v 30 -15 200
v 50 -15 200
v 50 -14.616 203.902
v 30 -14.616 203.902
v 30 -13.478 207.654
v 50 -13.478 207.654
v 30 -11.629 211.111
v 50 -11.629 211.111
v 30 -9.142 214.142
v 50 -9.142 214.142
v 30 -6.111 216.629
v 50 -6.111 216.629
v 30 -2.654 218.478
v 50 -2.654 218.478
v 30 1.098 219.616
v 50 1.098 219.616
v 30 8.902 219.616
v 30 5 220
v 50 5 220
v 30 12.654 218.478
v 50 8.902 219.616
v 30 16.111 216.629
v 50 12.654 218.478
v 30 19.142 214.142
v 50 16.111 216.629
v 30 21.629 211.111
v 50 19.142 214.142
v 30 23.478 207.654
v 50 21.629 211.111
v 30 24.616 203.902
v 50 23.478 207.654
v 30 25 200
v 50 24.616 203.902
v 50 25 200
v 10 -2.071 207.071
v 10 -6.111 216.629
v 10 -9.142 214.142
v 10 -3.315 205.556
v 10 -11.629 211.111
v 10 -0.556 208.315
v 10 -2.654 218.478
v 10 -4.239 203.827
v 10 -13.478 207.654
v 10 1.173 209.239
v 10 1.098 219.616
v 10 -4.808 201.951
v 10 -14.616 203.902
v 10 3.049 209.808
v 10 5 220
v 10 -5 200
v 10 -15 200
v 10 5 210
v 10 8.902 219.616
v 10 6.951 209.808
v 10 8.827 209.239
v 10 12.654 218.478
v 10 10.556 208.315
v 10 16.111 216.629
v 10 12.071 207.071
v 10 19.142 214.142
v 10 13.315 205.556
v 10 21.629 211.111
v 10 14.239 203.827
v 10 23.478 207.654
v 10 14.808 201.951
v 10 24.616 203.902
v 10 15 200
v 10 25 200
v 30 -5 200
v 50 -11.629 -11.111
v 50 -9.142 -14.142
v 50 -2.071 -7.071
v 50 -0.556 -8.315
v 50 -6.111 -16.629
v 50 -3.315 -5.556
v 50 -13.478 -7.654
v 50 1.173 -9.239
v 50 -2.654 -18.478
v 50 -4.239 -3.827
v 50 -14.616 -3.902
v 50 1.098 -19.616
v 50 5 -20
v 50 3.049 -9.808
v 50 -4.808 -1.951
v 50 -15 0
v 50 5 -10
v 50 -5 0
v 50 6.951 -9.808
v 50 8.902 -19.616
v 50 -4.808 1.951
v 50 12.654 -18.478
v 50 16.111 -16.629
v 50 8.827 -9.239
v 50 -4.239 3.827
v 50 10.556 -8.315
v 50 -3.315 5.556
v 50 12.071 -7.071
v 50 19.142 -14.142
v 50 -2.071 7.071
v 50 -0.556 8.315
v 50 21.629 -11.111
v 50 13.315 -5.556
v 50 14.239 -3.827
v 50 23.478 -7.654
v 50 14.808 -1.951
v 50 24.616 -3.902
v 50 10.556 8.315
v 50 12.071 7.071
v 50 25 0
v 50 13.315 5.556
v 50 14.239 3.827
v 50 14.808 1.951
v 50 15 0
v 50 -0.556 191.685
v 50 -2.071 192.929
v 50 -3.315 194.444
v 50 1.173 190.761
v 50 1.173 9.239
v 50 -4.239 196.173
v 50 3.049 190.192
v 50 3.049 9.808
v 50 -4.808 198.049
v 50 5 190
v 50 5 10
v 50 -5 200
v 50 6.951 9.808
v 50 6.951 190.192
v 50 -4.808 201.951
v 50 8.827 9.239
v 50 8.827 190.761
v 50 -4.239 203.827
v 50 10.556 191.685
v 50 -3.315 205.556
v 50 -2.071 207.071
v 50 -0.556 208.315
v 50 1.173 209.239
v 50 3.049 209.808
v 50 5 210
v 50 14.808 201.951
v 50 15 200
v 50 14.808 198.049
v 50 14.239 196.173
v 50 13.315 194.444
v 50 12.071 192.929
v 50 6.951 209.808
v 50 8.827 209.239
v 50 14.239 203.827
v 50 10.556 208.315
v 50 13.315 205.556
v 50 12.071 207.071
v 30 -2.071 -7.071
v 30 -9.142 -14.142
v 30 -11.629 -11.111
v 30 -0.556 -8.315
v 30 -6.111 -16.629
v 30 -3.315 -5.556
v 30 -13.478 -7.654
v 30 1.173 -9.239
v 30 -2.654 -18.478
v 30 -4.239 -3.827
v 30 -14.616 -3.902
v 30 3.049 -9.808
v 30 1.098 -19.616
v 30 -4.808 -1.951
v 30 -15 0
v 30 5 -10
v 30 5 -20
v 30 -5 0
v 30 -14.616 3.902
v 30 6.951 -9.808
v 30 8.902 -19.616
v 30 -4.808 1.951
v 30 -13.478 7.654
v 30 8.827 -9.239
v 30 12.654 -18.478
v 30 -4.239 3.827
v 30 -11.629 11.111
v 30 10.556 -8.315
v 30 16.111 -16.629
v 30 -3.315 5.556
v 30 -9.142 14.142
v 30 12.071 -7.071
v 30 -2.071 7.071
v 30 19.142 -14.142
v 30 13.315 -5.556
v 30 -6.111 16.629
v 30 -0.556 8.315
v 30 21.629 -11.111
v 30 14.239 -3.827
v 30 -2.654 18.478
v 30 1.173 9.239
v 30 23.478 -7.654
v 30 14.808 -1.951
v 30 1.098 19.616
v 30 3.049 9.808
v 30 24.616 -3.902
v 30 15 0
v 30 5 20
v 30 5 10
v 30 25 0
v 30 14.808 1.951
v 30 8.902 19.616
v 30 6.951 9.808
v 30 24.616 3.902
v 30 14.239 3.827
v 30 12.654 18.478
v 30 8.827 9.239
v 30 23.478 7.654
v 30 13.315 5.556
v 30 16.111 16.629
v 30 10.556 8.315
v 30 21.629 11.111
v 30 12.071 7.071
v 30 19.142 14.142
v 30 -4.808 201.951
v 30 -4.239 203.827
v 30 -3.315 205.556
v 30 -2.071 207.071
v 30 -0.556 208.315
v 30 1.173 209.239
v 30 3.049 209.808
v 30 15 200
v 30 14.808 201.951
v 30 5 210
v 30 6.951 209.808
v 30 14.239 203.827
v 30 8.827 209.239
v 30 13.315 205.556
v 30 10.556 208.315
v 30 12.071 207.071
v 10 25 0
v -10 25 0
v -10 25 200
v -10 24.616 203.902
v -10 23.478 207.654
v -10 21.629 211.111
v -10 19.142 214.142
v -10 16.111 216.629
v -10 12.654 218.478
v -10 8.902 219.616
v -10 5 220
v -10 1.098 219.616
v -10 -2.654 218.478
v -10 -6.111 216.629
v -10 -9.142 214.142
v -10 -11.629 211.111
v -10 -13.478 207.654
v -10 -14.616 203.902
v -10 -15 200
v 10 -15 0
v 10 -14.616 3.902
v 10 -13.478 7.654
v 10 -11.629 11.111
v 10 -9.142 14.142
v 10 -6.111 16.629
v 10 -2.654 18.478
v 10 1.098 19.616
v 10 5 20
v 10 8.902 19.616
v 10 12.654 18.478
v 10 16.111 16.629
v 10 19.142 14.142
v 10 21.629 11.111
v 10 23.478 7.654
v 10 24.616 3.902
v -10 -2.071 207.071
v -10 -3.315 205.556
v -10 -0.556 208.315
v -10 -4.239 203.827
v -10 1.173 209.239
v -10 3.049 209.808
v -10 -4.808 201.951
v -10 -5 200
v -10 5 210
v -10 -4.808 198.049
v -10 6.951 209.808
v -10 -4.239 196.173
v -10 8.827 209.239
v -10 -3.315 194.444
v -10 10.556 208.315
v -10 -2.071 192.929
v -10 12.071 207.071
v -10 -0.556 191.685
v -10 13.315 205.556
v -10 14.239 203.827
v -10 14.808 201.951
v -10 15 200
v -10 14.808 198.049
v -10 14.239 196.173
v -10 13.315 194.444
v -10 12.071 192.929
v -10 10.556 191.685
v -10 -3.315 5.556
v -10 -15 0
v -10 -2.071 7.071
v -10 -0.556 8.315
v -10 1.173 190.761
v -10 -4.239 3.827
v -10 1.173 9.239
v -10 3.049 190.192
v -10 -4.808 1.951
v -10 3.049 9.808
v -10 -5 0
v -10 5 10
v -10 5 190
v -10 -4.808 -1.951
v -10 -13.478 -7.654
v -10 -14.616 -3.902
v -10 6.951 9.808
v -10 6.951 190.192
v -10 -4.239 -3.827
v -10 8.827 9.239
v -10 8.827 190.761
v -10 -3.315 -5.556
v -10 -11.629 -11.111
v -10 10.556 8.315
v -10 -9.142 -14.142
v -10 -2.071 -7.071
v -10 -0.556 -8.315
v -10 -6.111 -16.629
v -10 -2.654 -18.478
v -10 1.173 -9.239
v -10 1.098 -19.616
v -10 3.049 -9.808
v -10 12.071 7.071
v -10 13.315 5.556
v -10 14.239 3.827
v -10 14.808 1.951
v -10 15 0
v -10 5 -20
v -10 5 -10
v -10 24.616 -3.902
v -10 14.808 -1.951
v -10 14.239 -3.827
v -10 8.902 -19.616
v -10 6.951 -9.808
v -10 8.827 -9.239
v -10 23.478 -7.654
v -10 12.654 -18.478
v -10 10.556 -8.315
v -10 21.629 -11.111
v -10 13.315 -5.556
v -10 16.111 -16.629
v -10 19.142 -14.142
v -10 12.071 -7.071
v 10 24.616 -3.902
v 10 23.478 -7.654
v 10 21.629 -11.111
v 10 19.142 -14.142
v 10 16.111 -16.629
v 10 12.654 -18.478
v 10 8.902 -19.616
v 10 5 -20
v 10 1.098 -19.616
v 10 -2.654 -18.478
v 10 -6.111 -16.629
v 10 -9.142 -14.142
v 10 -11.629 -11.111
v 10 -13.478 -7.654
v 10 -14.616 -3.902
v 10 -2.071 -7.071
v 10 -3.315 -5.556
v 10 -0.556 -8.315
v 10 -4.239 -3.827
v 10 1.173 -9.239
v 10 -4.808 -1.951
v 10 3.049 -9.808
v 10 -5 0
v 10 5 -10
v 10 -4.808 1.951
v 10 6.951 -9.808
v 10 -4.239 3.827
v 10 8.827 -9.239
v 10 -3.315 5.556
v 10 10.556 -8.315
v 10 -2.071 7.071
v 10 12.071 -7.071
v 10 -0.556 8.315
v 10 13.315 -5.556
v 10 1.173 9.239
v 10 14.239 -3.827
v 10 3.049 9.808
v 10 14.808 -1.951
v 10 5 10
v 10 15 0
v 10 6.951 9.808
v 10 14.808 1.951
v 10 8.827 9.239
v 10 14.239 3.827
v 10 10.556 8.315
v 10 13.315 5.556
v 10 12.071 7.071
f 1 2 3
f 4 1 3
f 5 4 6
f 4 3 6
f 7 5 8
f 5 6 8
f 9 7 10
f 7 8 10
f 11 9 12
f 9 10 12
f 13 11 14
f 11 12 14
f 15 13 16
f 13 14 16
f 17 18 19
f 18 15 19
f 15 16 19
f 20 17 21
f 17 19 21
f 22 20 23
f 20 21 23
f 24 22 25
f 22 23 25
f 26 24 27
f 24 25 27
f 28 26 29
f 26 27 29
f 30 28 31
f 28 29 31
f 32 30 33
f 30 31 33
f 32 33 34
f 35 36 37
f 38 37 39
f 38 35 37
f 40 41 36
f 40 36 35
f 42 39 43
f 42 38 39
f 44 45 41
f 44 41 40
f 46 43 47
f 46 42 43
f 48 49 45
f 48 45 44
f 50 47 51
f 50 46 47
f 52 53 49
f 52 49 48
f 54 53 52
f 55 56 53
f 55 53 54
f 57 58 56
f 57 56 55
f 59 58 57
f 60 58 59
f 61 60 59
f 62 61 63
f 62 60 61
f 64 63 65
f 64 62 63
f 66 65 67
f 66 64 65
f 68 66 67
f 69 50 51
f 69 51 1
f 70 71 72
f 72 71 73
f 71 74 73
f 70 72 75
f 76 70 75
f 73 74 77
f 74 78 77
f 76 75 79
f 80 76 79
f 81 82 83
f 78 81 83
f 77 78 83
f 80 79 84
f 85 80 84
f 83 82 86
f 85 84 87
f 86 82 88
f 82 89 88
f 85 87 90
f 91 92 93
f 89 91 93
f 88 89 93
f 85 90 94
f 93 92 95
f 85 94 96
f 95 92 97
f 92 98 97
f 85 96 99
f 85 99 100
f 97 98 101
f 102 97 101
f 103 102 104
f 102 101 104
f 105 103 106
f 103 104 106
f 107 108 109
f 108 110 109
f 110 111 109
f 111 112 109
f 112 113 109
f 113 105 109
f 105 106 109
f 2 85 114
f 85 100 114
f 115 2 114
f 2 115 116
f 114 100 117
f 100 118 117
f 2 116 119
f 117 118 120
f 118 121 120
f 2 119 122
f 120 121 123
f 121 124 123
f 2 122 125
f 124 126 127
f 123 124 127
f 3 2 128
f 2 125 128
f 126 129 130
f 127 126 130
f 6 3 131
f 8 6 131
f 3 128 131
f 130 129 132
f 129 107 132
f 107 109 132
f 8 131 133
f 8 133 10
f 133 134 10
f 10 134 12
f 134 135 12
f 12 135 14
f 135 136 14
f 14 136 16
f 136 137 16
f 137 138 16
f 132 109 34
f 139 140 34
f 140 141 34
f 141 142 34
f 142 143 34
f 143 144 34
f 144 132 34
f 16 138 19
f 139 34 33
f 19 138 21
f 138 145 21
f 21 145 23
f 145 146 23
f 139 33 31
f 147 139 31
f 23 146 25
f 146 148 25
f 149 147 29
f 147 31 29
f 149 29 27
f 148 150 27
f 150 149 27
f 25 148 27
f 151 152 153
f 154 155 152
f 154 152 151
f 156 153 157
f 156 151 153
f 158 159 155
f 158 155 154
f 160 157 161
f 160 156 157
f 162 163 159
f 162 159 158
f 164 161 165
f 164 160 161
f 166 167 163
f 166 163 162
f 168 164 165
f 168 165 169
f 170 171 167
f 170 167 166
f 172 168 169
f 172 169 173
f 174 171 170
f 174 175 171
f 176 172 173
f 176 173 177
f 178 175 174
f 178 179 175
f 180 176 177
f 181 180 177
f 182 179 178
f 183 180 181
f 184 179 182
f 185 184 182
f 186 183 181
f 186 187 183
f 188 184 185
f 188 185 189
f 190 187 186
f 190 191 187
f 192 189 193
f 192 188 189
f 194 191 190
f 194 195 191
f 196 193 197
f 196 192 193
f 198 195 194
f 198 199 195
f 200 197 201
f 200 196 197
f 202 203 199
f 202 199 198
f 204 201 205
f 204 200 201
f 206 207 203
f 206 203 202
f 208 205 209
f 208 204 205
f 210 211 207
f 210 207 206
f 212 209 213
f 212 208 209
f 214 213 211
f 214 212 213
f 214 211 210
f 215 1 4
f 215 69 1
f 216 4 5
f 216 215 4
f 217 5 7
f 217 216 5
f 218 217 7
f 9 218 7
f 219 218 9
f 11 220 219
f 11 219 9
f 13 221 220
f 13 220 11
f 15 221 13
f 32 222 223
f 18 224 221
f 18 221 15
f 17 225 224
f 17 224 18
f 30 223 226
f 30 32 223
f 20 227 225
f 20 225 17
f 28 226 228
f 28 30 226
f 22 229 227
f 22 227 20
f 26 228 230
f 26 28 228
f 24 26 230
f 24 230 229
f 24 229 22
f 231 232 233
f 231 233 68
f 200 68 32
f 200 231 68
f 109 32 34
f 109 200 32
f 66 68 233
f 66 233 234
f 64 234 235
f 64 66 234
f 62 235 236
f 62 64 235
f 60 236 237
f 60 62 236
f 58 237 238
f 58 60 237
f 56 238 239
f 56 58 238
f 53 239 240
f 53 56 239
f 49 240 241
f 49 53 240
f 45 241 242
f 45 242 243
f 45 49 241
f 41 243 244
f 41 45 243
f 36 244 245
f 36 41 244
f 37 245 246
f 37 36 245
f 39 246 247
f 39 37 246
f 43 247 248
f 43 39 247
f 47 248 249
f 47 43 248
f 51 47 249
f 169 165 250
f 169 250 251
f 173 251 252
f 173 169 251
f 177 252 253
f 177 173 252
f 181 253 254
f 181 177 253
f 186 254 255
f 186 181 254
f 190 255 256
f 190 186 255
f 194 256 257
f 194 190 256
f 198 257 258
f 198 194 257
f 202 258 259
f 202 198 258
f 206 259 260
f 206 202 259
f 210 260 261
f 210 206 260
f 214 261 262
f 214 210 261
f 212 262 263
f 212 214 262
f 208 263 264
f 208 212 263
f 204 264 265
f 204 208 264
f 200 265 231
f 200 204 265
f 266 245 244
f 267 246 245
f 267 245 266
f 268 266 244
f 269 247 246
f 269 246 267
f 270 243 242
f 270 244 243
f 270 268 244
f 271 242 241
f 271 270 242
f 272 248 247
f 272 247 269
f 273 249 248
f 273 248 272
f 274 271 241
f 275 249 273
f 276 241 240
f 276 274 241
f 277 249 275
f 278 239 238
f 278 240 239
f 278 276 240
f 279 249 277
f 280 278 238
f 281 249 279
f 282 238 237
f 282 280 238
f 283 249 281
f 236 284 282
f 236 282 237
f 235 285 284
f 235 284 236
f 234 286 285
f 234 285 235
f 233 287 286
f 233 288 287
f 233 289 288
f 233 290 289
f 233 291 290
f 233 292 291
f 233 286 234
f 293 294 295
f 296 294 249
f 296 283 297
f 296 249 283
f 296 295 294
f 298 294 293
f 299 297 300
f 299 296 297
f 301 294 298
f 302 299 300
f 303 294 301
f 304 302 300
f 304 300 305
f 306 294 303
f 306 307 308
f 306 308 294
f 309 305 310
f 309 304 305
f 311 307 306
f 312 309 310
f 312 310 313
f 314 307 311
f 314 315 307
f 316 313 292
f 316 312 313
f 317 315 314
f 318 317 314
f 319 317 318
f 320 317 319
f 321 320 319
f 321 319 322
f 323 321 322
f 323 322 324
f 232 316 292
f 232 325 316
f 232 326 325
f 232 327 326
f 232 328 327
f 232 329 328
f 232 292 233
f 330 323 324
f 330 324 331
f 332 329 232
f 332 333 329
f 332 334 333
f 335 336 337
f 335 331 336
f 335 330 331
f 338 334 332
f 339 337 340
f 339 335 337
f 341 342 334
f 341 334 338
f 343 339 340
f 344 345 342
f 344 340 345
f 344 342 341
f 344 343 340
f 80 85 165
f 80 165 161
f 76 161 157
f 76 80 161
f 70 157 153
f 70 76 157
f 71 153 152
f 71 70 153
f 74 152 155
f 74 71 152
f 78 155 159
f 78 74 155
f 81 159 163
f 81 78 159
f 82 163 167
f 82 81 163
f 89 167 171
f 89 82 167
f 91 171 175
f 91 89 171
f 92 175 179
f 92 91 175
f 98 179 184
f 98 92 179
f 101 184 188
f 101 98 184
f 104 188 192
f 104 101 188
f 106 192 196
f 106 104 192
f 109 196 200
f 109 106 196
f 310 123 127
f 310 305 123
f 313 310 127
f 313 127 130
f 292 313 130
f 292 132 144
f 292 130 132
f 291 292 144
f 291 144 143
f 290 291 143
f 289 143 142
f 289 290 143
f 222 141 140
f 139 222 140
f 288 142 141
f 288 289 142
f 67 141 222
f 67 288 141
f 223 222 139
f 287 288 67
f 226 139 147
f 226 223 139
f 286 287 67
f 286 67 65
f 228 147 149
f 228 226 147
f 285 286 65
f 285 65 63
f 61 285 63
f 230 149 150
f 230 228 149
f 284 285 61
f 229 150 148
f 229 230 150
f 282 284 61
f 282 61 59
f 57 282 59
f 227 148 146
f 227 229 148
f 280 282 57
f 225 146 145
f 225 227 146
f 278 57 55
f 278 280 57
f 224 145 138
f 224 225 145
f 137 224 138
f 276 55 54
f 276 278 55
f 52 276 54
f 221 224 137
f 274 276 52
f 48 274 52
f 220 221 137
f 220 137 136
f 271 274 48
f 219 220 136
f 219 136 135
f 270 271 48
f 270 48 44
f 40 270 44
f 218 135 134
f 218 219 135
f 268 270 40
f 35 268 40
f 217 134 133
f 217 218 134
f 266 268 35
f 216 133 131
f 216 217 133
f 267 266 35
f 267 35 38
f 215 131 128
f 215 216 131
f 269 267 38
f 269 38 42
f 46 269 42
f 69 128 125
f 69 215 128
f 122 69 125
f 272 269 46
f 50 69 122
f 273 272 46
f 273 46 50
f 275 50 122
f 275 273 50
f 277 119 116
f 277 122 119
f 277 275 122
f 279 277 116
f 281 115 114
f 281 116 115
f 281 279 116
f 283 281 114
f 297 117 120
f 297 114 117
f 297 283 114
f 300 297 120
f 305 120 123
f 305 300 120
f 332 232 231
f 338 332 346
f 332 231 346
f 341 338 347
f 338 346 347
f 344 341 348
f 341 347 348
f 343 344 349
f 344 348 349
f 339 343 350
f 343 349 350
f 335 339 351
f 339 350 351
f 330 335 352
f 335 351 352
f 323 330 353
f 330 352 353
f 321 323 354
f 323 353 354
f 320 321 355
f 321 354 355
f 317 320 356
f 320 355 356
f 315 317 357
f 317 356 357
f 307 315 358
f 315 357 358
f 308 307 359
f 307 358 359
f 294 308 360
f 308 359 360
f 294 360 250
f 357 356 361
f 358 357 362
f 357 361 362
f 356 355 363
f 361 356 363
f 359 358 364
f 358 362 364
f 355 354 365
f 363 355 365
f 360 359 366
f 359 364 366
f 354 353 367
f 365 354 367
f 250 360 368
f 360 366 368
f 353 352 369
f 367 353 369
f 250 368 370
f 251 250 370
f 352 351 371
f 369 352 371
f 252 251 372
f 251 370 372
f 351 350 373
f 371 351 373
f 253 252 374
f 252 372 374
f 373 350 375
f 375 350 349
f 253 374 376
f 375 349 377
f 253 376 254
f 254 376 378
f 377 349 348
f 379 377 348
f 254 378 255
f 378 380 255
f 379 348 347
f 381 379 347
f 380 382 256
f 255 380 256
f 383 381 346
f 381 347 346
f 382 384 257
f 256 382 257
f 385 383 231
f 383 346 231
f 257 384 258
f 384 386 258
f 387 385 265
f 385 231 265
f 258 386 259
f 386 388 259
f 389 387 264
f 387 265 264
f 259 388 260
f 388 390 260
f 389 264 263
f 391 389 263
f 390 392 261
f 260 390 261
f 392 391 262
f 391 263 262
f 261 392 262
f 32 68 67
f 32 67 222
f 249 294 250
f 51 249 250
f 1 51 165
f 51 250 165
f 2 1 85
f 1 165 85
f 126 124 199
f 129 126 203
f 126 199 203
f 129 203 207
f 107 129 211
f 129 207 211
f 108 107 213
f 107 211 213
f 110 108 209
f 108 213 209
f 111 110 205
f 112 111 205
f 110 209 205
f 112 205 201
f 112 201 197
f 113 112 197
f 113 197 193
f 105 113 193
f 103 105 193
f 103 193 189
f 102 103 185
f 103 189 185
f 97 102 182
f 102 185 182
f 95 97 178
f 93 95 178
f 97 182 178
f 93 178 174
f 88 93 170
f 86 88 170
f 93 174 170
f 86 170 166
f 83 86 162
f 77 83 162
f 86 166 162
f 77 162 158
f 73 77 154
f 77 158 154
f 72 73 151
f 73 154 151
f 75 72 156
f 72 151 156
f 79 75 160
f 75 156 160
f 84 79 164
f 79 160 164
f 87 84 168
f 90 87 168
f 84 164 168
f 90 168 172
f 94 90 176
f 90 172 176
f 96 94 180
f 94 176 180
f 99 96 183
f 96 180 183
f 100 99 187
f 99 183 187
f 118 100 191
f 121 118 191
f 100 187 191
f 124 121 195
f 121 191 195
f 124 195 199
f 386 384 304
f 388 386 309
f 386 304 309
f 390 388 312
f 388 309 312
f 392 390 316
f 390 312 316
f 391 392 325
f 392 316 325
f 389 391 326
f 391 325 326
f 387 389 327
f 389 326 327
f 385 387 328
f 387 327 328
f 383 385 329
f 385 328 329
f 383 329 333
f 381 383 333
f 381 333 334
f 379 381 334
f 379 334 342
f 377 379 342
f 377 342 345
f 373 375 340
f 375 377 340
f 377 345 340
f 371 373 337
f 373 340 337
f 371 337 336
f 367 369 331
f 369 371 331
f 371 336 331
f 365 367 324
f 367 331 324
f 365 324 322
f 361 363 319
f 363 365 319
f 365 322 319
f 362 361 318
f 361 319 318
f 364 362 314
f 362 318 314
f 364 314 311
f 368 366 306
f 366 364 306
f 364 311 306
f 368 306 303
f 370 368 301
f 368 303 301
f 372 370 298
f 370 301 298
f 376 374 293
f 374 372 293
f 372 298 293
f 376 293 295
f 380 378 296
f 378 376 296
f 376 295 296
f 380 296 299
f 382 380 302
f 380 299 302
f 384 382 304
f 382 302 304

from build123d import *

# Parameters (mm, degrees)
SKETCH_1_W          = 60
SKETCH_1_H          = 40
EXTRUDE_1_DEPTH     = 200
SKETCH_6_R          = 20
EXTRUDE_2_DEPTH     = 20
EXTRUDE_START       = -20
SKETCH_7_R          = 20
EXTRUDE_3_DEPTH     = 20
SKETCH_8_R          = 10
CUT_EXTRUDE_1_DEPTH = 211.297408448
SKETCH_9_R          = 20
CUT_EXTRUDE_2_DEPTH = 20


with BuildPart() as part:
    # 스케치1 → 보스-돌출1 (new body)
    with BuildSketch(Plane.XY):
        with Locations((20, 5)):
            Rectangle(SKETCH_1_W, SKETCH_1_H)
    extrude(amount=EXTRUDE_1_DEPTH)

    # 스케치6 → 보스-돌출2 (add)
    with BuildSketch(Plane(origin=(50, 0, 0), x_dir=(0, 0, -1), z_dir=(1, 0, 0))):
        with Locations((0, 5)):
            Circle(SKETCH_6_R)
    extrude_2 = extrude(amount=-EXTRUDE_2_DEPTH)

    # 스케치7 → 보스-돌출3 (add)
    with BuildSketch(Plane.ZY.offset(10).offset(EXTRUDE_START)):
        with Locations((0, 5)):
            Circle(SKETCH_7_R)
    extrude_3 = extrude(amount=EXTRUDE_3_DEPTH)

    # 스케치8 → 컷-돌출1 (cut, symmetric)
    with BuildSketch(Plane.ZY.offset(10)):
        with Locations((0, 5)):
            Circle(SKETCH_8_R)
    cut_extrude_1 = extrude(amount=CUT_EXTRUDE_1_DEPTH, both=True, mode=Mode.SUBTRACT)

    # 대칭 복사1: 보스-돌출2, 보스-돌출3, 컷-돌출1 across plane
    add(extrude_2.mirror(Plane.XY.offset(100)))
    add(extrude_3.mirror(Plane.XY.offset(100)))
    add(cut_extrude_1.mirror(Plane.XY.offset(100)), mode=Mode.SUBTRACT)

    # 스케치9 → 컷-돌출2 (cut)
    with BuildSketch(Plane.ZY.offset(-30)):
        with Locations((0, 5)):
            Circle(SKETCH_9_R)
    extrude(amount=CUT_EXTRUDE_2_DEPTH, mode=Mode.SUBTRACT)


solid = part.part
